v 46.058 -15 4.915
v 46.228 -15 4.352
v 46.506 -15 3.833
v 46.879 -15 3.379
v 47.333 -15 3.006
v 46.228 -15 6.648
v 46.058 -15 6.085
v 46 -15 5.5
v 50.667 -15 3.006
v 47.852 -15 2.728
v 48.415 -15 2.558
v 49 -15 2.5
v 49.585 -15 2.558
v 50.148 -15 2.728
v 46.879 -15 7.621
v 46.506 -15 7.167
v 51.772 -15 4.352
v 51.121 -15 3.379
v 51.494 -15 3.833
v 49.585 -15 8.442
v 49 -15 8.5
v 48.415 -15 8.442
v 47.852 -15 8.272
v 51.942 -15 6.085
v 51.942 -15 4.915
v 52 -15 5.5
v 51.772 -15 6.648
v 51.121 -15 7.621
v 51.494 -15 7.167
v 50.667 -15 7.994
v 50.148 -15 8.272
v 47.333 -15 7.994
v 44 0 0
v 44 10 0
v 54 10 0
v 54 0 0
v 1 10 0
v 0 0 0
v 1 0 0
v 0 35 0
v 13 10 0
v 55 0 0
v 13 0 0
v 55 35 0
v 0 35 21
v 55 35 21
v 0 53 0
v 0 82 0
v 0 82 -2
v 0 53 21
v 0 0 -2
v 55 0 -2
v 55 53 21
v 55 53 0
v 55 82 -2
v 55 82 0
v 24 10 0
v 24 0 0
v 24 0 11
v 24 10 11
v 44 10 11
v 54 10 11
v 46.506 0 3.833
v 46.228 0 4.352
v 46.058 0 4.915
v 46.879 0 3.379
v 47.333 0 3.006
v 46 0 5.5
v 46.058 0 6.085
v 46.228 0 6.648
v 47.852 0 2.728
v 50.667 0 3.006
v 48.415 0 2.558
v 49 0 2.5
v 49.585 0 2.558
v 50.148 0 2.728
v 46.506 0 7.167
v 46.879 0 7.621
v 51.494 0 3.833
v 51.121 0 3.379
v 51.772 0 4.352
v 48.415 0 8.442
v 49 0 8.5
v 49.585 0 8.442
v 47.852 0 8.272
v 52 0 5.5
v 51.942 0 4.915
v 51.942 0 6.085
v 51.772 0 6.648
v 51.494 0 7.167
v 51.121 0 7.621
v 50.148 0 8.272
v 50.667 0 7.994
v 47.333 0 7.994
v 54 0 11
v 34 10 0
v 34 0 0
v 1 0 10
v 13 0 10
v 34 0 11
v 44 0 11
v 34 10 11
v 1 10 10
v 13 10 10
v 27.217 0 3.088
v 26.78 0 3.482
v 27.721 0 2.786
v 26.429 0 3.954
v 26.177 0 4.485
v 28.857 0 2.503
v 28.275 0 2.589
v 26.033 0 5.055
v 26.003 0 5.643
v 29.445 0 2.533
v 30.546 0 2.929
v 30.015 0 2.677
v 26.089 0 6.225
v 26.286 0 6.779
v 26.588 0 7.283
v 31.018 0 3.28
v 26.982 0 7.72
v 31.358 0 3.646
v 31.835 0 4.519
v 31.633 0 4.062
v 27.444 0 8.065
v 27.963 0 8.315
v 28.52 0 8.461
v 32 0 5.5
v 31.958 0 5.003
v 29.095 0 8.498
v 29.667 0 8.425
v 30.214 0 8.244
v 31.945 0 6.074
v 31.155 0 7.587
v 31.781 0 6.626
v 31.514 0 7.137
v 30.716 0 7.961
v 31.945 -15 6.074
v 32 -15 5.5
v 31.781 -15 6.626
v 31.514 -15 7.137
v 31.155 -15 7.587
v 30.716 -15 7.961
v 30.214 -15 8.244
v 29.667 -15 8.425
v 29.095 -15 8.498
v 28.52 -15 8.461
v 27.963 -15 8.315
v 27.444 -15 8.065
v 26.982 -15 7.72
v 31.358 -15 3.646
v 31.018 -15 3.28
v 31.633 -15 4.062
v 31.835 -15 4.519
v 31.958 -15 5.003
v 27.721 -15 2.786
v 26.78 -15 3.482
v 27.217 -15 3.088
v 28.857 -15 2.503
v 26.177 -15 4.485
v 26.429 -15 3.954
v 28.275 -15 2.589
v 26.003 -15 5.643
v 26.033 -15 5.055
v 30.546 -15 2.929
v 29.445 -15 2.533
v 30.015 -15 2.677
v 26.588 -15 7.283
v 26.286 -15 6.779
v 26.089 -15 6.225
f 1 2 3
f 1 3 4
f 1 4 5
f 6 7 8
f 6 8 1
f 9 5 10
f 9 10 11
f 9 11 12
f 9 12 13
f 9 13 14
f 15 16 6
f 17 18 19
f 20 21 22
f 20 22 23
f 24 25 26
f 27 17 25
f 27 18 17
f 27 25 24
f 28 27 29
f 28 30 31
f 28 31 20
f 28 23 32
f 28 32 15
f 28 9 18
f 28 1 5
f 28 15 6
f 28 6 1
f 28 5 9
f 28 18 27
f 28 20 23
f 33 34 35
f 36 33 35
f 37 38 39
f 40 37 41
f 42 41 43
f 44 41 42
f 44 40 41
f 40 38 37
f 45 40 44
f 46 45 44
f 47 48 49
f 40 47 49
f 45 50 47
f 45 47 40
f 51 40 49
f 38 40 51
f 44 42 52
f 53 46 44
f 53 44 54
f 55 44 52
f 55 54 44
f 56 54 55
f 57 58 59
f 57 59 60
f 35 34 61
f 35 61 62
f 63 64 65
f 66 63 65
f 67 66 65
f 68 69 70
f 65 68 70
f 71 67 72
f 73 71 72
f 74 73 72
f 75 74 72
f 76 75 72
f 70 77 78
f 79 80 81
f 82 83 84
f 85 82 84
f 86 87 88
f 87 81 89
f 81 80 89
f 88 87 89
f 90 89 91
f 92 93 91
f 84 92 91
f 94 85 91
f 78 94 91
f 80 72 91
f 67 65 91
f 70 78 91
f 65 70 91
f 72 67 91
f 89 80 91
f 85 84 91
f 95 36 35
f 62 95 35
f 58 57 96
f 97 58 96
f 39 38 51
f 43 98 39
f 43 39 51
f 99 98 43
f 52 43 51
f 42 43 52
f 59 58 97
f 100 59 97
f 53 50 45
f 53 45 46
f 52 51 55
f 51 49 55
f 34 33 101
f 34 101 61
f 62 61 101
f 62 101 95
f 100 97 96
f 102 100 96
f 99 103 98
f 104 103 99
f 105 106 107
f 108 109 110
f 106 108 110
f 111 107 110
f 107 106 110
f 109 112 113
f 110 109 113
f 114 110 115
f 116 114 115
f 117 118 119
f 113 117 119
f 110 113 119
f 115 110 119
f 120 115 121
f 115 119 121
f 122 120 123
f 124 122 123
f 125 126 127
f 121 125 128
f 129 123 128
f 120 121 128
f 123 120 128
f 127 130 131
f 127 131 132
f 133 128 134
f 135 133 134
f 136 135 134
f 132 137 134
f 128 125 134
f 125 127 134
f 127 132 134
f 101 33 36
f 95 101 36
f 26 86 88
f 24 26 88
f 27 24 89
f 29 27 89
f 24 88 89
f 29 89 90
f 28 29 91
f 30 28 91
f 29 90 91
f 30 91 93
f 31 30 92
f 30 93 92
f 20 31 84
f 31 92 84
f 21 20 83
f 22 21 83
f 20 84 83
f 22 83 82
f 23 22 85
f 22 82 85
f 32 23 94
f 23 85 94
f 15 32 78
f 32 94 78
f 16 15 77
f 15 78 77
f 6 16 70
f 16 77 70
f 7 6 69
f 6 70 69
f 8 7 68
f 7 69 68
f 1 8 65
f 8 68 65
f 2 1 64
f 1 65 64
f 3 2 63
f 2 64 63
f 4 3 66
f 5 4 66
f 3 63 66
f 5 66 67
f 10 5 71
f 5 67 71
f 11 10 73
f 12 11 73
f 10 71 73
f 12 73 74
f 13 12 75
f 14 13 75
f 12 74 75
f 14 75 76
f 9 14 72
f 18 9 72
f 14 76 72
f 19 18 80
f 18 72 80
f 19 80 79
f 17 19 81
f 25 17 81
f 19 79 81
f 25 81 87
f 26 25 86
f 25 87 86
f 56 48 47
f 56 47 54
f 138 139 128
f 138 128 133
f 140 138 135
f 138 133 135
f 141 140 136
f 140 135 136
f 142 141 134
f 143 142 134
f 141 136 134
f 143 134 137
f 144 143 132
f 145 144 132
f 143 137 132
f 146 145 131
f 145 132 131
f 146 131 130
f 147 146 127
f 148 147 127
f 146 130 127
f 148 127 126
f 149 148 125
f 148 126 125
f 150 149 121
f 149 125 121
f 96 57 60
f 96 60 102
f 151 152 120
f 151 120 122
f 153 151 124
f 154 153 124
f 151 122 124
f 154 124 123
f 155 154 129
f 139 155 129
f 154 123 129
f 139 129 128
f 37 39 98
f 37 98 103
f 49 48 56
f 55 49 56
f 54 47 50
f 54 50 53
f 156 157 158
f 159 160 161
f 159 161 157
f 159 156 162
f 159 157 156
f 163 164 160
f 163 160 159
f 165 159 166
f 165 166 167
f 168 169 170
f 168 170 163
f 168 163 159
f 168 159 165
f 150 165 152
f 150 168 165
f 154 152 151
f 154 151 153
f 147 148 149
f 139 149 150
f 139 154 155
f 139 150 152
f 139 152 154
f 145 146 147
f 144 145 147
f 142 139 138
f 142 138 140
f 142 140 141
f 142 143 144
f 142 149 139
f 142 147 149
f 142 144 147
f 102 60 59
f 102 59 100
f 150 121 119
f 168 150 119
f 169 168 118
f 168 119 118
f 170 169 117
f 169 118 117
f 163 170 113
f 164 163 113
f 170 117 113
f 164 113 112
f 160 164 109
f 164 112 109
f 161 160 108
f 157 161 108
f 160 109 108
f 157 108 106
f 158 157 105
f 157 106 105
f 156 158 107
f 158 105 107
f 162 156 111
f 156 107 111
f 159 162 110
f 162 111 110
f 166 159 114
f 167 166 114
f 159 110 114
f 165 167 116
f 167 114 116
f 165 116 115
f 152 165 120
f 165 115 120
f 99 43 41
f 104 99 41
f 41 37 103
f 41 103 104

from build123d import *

# Parameters (mm, degrees)
F0_W     = 12
F0_H     = 10
F0_W_2   = 55
F0_H_2   = 18
F0_H_3   = 29
F0_W_3   = 10
F1_DEPTH = 2
F2_DEPTH = 11
F3_DEPTH = 10
F4_DEPTH = 21
F5_R     = 3
F6_DEPTH = 15


with BuildPart() as f1:
    # F0 (on Top) → F1 (new body)
    with BuildSketch(Plane.XY):
        Polygon((0, 35), (0, 0), (1, 0), (1, 10), (13, 10), (13, 0), (24, 0), (24, 10), (34, 10), (34, 0), (44, 0), (44, 10), (54, 10), (54, 0), (55, 0), (55, 35), align=None)
        with Locations((7, 5)):
            Rectangle(F0_W, F0_H)
        with Locations((27.5, 44)):
            Rectangle(F0_W_2, F0_H_2)
        with Locations((27.5, 67.5)):
            Rectangle(F0_W_2, F0_H_3)
        with Locations((29, 5)):
            Rectangle(F0_W_3, F0_H)
        with Locations((49, 5)):
            Rectangle(F0_W_3, F0_H)
    extrude(amount=-F1_DEPTH)

    # F0 (on Top) → F3 (join)
    with BuildSketch(Plane.XY):
        with Locations((7, 5)):
            Rectangle(F0_W, F0_H)
    extrude(amount=F3_DEPTH)

    # F0 (on Top) → F4 (join)
    with BuildSketch(Plane.XY):
        with Locations((27.5, 44)):
            Rectangle(F0_W_2, F0_H_2)
    extrude(amount=F4_DEPTH)


with BuildPart() as f2:
    # F0 (on Top) → F2 (new body)
    with BuildSketch(Plane.XY):
        with Locations((29, 5)):
            Rectangle(F0_W_3, F0_H)
        with Locations((49, 5)):
            Rectangle(F0_W_3, F0_H)
    extrude(amount=F2_DEPTH)


with BuildPart() as f6:
    # F5 (on face) → F6 (new body)
    with BuildSketch(Plane.XZ):
        with BuildLine():
            ThreePointArc((32, 5.5), (30.213661, 8.243543), (26.981982, 7.71982))
            Line((26.981982, 7.71982), (31.018018, 3.28018))
            ThreePointArc((31.018018, 3.28018), (31.743543, 4.286339), (32, 5.5))
        make_face()
        with BuildLine():
            Line((31.018018, 3.28018), (26.981982, 7.71982))
            ThreePointArc((26.981982, 7.71982), (26.78018, 3.481982), (31.018018, 3.28018))
        make_face()
        with Locations((49, 5.5)):
            Circle(F5_R)
    extrude(amount=F6_DEPTH)


solid = Compound([f1.part, f2.part, f6.part])
